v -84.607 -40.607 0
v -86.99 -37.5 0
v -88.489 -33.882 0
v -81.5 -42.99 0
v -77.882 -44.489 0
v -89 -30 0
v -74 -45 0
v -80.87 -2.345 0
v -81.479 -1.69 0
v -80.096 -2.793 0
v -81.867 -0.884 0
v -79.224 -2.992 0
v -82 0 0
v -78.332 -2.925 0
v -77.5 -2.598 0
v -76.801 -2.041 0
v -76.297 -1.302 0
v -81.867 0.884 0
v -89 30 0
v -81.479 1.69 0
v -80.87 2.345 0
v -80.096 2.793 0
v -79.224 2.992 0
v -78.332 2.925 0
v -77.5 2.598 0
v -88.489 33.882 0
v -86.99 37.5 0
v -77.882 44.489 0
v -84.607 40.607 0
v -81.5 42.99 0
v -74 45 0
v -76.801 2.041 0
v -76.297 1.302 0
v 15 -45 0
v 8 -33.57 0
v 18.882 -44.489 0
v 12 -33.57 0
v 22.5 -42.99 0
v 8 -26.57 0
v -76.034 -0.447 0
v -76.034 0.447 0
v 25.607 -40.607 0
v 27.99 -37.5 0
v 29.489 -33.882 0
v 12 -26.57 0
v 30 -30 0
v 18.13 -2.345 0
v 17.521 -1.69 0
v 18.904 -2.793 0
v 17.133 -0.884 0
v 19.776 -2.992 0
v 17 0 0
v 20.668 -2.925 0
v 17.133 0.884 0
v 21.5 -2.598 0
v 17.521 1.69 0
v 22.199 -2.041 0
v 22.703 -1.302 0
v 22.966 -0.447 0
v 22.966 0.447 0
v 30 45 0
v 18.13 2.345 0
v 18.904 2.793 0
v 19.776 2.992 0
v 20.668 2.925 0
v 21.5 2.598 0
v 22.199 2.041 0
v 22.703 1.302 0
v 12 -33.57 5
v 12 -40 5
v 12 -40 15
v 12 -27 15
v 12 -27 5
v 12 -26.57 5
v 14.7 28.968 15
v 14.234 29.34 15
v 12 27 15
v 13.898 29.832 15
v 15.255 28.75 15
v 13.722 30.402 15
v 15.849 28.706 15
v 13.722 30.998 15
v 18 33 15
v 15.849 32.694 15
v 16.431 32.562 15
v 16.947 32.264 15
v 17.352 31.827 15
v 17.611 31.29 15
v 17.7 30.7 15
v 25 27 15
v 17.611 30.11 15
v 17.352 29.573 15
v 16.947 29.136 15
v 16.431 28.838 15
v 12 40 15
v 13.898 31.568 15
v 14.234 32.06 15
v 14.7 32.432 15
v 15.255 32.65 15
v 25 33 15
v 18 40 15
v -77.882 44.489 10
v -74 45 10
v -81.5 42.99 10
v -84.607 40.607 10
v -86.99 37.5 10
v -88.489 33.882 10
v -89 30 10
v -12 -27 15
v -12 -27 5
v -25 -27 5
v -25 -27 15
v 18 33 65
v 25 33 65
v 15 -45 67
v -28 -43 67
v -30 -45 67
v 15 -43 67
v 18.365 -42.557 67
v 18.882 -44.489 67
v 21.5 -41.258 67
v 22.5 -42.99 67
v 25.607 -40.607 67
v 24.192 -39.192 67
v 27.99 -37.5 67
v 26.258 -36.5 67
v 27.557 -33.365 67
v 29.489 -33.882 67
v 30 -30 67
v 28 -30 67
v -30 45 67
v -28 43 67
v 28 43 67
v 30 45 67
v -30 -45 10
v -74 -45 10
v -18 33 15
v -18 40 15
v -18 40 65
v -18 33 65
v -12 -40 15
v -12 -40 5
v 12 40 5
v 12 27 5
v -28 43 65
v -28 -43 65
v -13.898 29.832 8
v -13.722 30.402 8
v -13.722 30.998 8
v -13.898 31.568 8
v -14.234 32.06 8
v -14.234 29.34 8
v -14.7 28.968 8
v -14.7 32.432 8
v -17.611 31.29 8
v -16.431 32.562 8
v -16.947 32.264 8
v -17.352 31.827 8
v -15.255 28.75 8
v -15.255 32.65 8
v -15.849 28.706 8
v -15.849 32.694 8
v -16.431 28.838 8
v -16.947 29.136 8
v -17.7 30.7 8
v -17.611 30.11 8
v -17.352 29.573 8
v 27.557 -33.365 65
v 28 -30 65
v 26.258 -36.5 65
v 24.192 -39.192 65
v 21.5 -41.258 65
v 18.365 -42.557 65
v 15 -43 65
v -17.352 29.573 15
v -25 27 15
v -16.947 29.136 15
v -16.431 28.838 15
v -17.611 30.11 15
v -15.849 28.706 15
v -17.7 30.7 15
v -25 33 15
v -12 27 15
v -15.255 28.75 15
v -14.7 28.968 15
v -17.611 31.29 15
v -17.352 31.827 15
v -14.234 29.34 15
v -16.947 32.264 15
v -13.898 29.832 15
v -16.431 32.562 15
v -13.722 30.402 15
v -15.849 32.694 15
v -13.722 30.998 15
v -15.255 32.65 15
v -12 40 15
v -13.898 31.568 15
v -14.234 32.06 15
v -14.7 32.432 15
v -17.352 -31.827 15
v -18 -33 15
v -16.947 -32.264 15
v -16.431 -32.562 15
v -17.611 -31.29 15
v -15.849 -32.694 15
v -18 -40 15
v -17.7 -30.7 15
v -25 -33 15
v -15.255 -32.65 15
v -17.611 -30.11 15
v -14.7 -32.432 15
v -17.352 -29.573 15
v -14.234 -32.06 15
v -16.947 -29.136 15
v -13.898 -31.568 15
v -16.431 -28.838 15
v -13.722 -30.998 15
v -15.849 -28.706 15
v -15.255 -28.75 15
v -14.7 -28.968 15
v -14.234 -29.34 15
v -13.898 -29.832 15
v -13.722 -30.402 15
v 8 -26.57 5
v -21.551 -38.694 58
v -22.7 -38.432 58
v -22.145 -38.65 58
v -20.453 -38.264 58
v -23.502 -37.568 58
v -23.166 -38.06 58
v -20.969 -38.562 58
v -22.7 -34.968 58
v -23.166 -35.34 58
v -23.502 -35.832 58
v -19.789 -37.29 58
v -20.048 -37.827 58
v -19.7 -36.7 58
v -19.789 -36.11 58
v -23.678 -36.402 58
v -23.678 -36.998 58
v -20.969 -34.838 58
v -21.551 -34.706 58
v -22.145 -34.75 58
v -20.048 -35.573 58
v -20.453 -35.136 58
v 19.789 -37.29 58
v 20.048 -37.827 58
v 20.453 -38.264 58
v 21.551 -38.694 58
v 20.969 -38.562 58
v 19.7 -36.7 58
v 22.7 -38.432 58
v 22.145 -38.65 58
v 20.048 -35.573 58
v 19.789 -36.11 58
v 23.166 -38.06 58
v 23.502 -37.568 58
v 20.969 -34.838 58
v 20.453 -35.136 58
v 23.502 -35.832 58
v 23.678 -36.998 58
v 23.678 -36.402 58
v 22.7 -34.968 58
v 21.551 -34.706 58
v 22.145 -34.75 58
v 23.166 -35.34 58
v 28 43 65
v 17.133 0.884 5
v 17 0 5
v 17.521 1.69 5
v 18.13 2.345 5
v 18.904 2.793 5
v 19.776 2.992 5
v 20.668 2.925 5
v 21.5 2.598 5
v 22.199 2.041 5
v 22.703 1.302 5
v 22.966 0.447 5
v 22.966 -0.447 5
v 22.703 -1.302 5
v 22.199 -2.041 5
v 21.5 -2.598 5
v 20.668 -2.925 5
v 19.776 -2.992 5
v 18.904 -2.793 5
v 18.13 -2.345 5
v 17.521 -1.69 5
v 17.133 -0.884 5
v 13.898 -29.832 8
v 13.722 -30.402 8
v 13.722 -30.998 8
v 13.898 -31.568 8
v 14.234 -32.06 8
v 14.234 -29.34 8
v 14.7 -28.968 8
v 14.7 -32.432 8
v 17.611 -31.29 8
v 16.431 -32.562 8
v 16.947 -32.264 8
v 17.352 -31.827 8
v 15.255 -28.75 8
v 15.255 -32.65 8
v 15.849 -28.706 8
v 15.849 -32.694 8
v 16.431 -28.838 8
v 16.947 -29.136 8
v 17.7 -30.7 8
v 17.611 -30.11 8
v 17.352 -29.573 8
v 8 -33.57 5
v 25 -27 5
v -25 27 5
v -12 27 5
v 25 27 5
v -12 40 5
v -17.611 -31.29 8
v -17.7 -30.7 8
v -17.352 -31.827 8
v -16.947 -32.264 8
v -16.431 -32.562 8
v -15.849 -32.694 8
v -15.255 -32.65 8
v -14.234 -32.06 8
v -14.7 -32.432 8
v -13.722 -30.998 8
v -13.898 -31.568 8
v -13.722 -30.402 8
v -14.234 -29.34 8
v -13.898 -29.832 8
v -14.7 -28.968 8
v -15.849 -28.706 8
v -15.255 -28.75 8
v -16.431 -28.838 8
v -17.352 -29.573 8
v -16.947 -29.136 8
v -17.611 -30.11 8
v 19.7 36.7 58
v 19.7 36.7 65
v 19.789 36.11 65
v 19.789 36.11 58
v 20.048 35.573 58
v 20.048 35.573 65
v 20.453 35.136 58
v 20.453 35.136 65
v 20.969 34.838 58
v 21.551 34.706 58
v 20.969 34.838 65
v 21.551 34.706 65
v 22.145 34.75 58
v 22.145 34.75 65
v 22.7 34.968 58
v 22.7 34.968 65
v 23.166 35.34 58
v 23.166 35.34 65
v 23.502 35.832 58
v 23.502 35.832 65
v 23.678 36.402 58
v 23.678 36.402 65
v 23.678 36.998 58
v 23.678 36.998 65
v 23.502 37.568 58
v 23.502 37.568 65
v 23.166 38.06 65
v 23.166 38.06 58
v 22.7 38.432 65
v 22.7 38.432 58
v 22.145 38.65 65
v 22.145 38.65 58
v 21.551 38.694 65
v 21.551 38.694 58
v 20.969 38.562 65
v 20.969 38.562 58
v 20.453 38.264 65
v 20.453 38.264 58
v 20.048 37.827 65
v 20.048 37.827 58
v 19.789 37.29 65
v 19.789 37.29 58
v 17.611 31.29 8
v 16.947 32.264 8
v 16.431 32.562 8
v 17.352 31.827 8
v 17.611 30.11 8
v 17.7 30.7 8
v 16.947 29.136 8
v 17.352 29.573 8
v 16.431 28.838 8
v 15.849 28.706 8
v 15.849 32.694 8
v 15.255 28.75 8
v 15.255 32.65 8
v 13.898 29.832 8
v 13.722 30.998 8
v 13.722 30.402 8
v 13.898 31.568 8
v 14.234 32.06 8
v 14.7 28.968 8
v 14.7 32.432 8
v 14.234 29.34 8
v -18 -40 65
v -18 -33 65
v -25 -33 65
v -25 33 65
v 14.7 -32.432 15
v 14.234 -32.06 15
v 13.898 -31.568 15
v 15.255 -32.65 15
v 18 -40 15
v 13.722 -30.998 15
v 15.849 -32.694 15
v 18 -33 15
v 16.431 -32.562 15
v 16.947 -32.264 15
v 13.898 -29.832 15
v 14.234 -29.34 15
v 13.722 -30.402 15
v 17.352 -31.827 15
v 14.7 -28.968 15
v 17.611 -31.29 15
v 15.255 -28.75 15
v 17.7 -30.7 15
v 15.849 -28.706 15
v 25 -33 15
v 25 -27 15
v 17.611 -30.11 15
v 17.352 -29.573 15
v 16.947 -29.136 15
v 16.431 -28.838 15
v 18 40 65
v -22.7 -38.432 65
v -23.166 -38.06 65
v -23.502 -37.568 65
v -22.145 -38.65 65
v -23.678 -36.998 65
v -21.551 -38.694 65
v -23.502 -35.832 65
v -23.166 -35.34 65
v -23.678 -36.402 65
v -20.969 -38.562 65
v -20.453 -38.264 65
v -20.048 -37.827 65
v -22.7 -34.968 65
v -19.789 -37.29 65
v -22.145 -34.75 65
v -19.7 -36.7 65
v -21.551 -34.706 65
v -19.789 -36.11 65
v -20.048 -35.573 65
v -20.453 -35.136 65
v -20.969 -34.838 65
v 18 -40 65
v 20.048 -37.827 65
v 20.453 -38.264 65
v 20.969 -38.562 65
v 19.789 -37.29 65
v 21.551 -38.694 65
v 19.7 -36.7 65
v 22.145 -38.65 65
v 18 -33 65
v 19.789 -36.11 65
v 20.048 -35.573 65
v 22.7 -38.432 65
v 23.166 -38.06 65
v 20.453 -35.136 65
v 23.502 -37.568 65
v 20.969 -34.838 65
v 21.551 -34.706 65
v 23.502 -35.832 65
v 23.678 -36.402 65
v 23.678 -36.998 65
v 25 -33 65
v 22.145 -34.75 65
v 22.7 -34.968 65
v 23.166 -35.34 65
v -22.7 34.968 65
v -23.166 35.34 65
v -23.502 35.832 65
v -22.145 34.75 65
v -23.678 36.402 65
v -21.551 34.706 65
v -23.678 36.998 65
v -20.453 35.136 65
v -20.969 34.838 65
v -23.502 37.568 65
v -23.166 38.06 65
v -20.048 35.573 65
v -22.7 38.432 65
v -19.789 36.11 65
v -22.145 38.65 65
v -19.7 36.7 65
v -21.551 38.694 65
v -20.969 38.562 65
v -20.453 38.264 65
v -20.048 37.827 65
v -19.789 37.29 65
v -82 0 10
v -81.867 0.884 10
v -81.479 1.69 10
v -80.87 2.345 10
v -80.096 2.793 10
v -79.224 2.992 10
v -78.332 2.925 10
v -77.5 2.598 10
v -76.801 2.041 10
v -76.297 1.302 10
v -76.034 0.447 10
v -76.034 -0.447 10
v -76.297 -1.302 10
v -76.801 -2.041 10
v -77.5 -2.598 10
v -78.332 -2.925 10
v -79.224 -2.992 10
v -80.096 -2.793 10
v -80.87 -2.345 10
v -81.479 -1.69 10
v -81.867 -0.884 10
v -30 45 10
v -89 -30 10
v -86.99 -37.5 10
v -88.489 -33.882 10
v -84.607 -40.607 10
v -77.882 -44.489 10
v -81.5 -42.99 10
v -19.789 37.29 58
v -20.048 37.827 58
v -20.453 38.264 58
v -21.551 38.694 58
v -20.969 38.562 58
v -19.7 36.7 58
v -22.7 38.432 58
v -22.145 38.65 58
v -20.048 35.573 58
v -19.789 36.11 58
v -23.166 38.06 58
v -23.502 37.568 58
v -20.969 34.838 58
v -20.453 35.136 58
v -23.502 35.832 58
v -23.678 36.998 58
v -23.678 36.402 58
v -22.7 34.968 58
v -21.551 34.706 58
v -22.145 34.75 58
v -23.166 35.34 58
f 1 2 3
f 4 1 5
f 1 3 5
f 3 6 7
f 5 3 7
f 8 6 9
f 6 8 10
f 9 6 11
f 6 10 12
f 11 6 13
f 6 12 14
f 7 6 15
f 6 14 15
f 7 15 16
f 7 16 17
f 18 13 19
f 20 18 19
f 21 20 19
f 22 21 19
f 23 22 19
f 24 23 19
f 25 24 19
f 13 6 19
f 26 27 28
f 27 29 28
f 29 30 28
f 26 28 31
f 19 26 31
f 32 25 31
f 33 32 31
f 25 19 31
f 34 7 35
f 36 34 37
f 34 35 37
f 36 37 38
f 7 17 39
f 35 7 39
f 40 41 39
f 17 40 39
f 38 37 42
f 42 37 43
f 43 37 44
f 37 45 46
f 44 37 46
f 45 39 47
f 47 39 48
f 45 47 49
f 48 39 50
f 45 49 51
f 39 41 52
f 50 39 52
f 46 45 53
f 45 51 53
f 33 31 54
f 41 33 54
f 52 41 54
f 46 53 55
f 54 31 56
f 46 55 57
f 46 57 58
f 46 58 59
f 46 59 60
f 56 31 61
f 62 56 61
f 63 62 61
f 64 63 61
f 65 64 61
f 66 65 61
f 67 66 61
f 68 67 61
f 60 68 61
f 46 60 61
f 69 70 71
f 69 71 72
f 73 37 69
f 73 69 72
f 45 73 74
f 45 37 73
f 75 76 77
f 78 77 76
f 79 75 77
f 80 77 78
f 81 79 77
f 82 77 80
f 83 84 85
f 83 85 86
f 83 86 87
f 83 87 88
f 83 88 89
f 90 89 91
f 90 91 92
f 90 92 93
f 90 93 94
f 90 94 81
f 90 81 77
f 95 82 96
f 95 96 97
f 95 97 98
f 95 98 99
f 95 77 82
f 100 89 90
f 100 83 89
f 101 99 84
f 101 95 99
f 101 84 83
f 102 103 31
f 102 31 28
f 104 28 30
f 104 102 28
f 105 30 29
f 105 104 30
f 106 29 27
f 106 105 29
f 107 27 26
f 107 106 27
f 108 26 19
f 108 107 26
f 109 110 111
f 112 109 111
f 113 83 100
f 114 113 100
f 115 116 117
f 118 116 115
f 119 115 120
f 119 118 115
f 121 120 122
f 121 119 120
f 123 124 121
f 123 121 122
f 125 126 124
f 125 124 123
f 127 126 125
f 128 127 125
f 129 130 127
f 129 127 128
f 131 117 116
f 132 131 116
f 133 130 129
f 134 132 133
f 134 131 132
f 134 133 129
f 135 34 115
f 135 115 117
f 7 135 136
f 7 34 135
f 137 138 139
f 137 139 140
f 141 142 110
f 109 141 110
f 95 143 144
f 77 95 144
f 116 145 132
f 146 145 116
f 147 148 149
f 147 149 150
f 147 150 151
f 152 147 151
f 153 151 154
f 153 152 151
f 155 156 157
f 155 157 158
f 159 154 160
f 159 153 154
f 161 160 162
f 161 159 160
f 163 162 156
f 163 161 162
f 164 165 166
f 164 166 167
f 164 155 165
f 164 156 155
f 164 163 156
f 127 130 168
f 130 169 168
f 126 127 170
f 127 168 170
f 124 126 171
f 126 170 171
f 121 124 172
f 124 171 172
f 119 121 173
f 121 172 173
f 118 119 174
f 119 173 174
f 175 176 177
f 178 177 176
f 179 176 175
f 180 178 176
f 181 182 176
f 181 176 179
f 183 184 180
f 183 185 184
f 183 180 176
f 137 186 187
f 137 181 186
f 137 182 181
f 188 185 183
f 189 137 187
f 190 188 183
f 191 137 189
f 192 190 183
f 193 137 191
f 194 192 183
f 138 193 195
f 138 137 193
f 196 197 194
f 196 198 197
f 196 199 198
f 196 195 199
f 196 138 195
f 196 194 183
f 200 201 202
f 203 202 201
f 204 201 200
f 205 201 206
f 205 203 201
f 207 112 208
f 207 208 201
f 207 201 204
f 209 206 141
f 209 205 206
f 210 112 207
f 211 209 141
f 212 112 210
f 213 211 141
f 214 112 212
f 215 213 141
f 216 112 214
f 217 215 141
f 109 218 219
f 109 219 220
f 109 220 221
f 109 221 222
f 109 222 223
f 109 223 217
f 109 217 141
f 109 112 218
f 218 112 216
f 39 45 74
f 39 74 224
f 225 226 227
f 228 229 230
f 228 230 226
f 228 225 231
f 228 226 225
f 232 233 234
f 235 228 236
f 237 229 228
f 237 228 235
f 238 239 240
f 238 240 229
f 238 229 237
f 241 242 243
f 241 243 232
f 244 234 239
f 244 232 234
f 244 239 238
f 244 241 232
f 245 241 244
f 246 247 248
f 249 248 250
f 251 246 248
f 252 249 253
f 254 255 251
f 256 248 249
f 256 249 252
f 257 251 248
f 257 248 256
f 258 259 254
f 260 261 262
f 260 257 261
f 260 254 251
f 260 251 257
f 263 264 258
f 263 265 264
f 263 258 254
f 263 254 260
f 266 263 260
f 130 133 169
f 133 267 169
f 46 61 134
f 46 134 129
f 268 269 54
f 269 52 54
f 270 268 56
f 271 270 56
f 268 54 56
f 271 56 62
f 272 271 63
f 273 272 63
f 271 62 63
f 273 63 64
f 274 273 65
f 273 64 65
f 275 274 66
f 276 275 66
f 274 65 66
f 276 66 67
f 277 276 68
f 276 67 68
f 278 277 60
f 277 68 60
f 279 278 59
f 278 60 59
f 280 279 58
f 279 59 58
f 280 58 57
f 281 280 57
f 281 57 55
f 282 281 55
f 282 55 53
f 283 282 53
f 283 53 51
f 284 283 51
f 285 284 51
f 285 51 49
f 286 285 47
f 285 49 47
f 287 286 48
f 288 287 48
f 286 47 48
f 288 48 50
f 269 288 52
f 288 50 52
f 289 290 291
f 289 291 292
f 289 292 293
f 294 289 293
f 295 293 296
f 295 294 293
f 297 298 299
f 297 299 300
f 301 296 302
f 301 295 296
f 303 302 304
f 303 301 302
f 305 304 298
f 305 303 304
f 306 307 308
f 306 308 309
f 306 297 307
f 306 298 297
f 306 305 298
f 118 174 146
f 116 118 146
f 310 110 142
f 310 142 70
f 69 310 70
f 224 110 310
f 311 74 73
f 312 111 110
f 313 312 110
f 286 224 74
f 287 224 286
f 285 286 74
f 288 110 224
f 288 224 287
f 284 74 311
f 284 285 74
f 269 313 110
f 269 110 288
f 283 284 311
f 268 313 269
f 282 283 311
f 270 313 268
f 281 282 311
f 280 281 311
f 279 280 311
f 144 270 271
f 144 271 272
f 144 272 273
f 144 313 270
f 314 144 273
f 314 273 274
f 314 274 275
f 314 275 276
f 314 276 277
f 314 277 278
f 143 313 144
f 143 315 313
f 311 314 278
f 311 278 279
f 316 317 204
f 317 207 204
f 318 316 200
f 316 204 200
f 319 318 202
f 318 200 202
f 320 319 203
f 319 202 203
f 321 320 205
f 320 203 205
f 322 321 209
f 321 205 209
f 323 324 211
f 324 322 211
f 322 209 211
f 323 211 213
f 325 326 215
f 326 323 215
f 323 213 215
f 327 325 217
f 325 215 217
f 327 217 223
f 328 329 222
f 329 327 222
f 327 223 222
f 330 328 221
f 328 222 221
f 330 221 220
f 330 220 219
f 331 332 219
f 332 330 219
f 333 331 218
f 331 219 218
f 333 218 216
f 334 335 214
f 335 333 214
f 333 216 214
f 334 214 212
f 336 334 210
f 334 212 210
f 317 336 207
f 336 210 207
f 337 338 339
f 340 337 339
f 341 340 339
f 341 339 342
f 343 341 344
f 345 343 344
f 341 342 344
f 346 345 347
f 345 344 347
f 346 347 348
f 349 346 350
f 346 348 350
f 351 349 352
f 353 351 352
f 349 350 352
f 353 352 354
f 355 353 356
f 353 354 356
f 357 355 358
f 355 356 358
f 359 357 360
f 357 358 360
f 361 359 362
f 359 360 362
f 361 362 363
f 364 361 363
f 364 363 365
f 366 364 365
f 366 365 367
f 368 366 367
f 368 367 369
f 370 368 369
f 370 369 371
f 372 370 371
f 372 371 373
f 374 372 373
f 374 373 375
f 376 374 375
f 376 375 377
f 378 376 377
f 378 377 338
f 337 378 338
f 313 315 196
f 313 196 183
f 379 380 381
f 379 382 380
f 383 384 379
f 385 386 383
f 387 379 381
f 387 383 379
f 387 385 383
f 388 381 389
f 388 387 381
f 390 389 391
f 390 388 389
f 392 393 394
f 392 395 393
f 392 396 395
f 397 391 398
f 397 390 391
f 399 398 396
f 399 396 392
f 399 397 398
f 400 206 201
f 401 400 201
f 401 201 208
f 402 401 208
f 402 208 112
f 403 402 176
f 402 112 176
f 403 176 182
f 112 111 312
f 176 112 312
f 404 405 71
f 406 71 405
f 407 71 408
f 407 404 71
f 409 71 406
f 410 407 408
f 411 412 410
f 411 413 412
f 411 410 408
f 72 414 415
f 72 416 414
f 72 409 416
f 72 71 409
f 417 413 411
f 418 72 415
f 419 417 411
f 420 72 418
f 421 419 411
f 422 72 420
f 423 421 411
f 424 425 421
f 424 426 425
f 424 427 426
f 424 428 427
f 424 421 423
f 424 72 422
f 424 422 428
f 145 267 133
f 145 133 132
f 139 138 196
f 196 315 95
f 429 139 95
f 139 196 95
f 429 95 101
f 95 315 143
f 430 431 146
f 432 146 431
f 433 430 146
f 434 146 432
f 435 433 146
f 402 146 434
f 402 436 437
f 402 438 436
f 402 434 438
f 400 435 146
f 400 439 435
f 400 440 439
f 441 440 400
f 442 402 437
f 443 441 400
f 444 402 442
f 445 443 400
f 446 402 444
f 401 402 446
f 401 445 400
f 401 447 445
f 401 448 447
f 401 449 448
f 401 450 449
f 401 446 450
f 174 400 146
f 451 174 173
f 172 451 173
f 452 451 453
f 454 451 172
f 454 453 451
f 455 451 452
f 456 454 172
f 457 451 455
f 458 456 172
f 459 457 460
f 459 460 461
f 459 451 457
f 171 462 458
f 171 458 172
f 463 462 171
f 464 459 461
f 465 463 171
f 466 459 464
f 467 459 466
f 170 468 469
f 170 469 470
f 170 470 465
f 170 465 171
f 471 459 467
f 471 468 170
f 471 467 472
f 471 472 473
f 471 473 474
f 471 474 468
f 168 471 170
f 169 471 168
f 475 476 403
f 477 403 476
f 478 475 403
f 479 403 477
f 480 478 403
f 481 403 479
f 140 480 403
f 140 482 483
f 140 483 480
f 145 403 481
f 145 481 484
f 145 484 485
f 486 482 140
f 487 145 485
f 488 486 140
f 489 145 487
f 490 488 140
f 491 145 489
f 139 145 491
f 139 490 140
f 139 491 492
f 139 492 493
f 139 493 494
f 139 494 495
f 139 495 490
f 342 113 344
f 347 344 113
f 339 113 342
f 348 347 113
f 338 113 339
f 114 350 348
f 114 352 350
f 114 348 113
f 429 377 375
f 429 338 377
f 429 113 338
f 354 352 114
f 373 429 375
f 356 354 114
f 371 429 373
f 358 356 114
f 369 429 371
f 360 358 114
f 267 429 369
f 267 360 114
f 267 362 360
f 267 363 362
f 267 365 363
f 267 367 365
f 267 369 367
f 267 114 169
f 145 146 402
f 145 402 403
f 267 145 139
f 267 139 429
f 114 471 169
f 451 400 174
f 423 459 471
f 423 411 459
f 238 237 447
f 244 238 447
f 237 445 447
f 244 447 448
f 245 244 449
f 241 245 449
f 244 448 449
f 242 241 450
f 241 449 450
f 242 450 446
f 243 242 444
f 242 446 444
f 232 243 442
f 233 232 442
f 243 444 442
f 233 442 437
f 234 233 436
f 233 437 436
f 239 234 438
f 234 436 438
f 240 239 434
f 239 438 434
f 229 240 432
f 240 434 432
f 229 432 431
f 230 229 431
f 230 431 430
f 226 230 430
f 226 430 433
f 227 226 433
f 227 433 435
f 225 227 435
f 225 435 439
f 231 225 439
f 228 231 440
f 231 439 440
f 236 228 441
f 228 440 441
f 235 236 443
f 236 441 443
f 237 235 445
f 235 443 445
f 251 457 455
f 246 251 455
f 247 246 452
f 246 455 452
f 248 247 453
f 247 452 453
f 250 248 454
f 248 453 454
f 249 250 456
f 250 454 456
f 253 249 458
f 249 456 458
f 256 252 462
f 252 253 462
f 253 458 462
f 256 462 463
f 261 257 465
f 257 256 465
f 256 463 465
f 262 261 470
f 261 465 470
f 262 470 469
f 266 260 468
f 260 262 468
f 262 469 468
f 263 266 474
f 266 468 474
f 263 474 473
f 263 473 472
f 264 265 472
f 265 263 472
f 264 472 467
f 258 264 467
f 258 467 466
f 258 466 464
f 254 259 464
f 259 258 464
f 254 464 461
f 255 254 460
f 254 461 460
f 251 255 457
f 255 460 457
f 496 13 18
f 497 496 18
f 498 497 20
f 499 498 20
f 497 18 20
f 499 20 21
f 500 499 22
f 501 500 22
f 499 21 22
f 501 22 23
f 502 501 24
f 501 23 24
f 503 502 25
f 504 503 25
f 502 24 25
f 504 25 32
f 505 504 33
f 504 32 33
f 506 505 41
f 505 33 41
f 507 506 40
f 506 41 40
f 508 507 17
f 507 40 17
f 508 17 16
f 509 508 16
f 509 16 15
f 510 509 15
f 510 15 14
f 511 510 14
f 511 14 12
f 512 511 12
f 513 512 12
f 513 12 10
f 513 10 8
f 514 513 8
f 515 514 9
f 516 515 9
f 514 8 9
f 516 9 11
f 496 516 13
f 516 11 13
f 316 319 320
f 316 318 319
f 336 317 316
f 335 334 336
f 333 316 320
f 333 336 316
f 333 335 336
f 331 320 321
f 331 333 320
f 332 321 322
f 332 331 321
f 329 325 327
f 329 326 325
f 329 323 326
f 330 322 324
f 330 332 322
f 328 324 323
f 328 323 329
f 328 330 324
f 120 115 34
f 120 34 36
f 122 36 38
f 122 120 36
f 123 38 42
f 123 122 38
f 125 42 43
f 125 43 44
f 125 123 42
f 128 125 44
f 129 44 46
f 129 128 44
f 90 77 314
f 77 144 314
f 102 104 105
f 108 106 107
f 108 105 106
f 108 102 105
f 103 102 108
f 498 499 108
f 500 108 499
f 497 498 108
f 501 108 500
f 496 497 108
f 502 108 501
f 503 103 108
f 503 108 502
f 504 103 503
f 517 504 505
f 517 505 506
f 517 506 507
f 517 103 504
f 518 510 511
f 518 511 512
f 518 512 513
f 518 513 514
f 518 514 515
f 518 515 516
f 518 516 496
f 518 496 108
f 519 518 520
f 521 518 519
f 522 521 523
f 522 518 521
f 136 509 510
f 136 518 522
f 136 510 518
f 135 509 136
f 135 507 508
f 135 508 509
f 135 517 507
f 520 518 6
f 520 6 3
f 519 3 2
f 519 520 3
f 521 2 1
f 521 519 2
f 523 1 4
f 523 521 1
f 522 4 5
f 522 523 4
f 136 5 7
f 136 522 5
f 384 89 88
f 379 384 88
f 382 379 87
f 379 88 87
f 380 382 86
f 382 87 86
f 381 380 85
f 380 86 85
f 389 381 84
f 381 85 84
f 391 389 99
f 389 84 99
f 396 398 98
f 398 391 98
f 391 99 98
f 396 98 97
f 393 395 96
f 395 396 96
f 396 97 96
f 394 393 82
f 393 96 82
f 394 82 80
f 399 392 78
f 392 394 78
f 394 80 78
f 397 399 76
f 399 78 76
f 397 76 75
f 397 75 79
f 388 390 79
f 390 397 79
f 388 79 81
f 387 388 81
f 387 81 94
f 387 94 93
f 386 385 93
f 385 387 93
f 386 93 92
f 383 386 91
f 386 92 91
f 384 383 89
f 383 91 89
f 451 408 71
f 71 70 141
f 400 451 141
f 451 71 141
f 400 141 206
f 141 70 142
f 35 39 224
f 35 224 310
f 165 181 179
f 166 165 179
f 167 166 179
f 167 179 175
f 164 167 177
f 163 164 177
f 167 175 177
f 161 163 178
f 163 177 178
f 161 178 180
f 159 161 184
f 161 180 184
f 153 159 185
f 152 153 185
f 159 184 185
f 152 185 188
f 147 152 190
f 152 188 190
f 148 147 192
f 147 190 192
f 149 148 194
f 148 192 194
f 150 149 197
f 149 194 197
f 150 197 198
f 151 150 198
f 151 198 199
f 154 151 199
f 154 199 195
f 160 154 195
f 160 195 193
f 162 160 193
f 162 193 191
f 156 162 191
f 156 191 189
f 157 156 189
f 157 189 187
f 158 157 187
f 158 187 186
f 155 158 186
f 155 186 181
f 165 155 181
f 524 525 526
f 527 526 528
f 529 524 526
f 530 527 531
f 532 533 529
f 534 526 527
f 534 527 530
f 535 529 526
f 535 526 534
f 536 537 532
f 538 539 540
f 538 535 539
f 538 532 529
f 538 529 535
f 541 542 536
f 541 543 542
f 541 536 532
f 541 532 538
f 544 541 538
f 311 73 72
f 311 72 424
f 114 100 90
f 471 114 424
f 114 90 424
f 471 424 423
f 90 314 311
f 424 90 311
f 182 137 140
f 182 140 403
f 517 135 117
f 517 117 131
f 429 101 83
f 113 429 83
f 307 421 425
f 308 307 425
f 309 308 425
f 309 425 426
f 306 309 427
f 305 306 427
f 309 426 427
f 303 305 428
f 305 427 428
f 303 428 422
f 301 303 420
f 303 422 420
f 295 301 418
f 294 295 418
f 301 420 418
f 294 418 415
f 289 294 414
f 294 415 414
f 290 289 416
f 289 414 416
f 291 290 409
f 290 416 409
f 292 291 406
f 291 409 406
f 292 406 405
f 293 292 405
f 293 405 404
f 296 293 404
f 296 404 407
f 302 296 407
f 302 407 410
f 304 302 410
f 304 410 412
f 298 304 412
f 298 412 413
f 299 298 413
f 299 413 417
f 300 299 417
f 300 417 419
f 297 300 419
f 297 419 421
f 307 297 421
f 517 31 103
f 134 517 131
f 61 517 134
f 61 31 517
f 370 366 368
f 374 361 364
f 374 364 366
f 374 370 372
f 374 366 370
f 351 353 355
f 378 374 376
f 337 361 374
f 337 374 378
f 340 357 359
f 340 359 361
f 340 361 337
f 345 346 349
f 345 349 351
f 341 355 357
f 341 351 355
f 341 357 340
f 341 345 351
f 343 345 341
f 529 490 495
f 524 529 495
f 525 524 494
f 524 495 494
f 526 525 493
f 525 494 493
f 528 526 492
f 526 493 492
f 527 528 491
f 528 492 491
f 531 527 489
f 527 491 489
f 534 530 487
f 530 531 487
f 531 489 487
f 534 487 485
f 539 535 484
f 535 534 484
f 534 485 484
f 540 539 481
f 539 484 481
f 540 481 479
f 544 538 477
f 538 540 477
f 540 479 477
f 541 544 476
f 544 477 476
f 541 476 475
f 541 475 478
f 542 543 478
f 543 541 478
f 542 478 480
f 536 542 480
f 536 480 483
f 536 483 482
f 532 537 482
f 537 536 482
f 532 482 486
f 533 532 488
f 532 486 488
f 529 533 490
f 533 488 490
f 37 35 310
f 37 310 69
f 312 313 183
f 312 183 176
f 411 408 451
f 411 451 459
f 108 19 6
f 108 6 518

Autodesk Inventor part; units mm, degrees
ref_plane "YZ Plane" through (0, 0, 0) normal (1, 0, 0) x (0, 1, 0)
ref_plane "XZ Plane" through (0, 0, 0) normal (0, 1, 0) x (-1, 0, 0)
ref_plane "XY Plane" through (0, 0, 0) normal (0, 0, 1) x (1, 0, 0)
sketch "Skizze61" plane through (0, 0, 0) normal (0, 0, 1) x (1, 0, 0)
  line L0 (30, -45) -> (-30, -45)
  line L1 (-30, -45) -> (-30, 45)
  line L2 (-30, 45) -> (30, 45)
  line L3 (30, 45) -> (30, -45)
  line L4 (30, -45) -> (-30, 45) construction
  line L5 (-30, -45) -> (30, 45) construction
  point P0 (0, 0)
  dimension "d159" = 60
  dimension "d160" = 90
extrude "Extrusion54" add sketch "Skizze61" along normal blind 65
shell "Wandung3" thickness 5 removed faces 1 at (-10, 15, 65)
sketch "Sketch69" plane through (-30, -45, 0) normal (-1, 0, 0) x (0, 0, 1)
  line L0 (0, 90) -> (65, 90) projected
  line L1 (0, 0) -> (65, 0) projected
  line L2 (0, 90) -> (10, 90)
  line L3 (10, 90) -> (10, 0)
  line L4 (10, 0) -> (0, 0)
  line L5 (0, 0) -> (0, 90)
  point P0 (0, 45)
  dimension "d192" = 10
extrude "Extrusion61" add sketch "Sketch69" along normal blind 59
sketch "Sketch71" plane through (0, 0, 0) normal (0, 0, -1) x (-1, 0, 0)
  line L0 (-8, -33.57) -> (-12, -33.57)
  line L1 (-12, -33.57) -> (-12, -26.57)
  line L2 (-12, -26.57) -> (-8, -26.57)
  line L3 (-8, -26.57) -> (-8, -33.57)
  line L4 (89, 45) -> (89, -45) projected
  line L5 (-30, -45) -> (89, -45) projected
  point P0 (0, 0)
  dimension "d199" = 4
  dimension "d200" = 7
  dimension "d201" = 97
  dimension "d202" = 11.43
extrude "Extrusion63" cut sketch "Sketch71" against normal blind 10
sketch "Sketch70" plane through (0, 0, 0) normal (0, 0, -1) x (-1, 0, 0)
  line L0 (30, 45) -> (89, 45) projected
  line L1 (30, -45) -> (89, -45) projected
  line L2 (89, 45) -> (69, 45)
  line L3 (69, 45) -> (69, -45)
  line L4 (69, -45) -> (89, -45)
  line L5 (89, -45) -> (89, 45)
  circle A0 centre (79, 0) radius 3
  point P0 (0, 0)
  dimension "d195" = 20
  dimension "d196" = 6
extrude "Extrusion62" cut sketch "Sketch70" against normal through all contours A0
sketch "Sketch72" plane through (0, 0, 0) normal (0, 0, -1) x (-1, 0, 0)
  circle A0 centre (-20, 0) radius 3
  line L0 (-30, -45) -> (-30, 45) projected
  point P0 (0, 0)
  dimension "d205" = 6
  dimension "d206" = 10
extrude "Extrusion64" cut sketch "Sketch72" against normal through all
sketch "Sketch73" plane through (0, 0, 0) normal (0, 0, -1) x (-1, 0, 0)
  point P0 (0, 0)
fillet "Rundung1" radius 15 2 edges at (-89, 45, 5) (-89, -45, 5)
fillet "Rundung2" radius 15 1 edges at (30, -45, 32.5)
sketch "Skizze78" plane through (-25, 40, 5) normal (0, 0, 1) x (1, 0, 0)
  line L0 (0, 0) -> (7, 0)
  line L1 (7, 0) -> (7, -7)
  line L2 (7, -7) -> (0, -7)
  line L3 (0, -7) -> (0, 0)
  line L4 (50, -80) -> (50, 0) projected
  line L5 (50, 0) -> (43, 0)
  line L6 (43, 0) -> (43, -7)
  line L7 (43, -7) -> (50, -7)
  line L8 (50, -7) -> (50, 0)
  line L9 (50, -80) -> (0, -80) projected
  line L10 (0, -80) -> (7, -80)
  line L11 (7, -80) -> (7, -73)
  line L12 (7, -73) -> (0, -73)
  line L13 (0, -73) -> (0, -80)
  line L14 (50, -80) -> (43, -80)
  line L15 (43, -80) -> (43, -73)
  line L16 (43, -73) -> (50, -73)
  line L17 (50, -73) -> (50, -80)
  point P0 (25, -40)
  dimension "d239" = 7
  dimension "d240" = 7
  dimension "d241" = 7
  dimension "d242" = 7
  dimension "d243" = 7
  dimension "d244" = 7
  dimension "d245" = 7
  dimension "d246" = 7
extrude "Extrusion68" add sketch "Skizze78" along normal up to surface (60 mm away)
sketch "Skizze79" plane through (0, 0, 65) normal (0, 0, 1) x (1, 0, 0)
  line L0 (30, 45) -> (-30, 45) projected
  line L1 (-30, -45) -> (15, -45) projected
  line L2 (-30, 45) -> (-28, 45)
  line L3 (-28, 45) -> (-28, -45)
  line L4 (-28, -45) -> (-30, -45)
  line L5 (-30, -45) -> (-30, 45)
  line L6 (30, -30) -> (30, 45) projected
  line L7 (-28, 45) -> (30, 45)
  line L8 (30, 45) -> (30, 43)
  line L9 (30, 43) -> (-28, 43)
  line L10 (-28, 43) -> (-28, 45)
  line L11 (30, 43) -> (28, 43)
  line L12 (28, 43) -> (28, -30)
  line L13 (28, -30) -> (30, -30)
  line L14 (30, -30) -> (30, 43)
  line L15 (-28, -45) -> (15, -45)
  line L16 (15, -45) -> (15, -43)
  line L17 (15, -43) -> (-28, -43)
  line L18 (-28, -43) -> (-28, -45)
  arc A0 (15, -45) -> (30, -30) centre (15, -30) ccw projected
  arc A1 (15, -45) -> (30, -30) centre (15, -30) ccw
  arc A2 (15, -43) -> (28, -30) centre (15, -30) ccw
  point P0 (0, 0)
  point P1 (-28, -43)
  point P2 (29, -30)
  dimension "d249" = 2
  dimension "d250" = 2
  dimension "d251" = 2
  dimension "d252" = 2
  dimension "d268" = 75
extrude "Extrusion69" add sketch "Skizze79" along normal blind 2 contours L6 L9 L3 L0 | L3 L1 L5 L0 | L6 L13 L12 L9 | A0 L16 A2 L13 | L17 L16 L1 L3
sketch "Skizze80" plane through (-18, -40, 5) normal (0, 0, 1) x (1, 0, 0)
  line L0 (0, 80) -> (36, 80) projected
  line L1 (0, 80) -> (6, 80)
  line L2 (6, 80) -> (6, 67)
  line L3 (6, 67) -> (0, 67)
  line L4 (0, 67) -> (0, 80)
  line L5 (-7, 7) -> (-7, 73) projected
  line L6 (0, 67) -> (-7, 67)
  line L7 (-7, 67) -> (-7, 73)
  line L8 (-7, 73) -> (0, 73)
  line L9 (0, 73) -> (0, 67)
  line L10 (36, 73) -> (36, 80) projected
  line L11 (36, 80) -> (30, 80)
  line L12 (30, 80) -> (30, 67)
  line L13 (30, 67) -> (36, 67)
  line L14 (36, 67) -> (36, 80)
  line L15 (43, 7) -> (43, 73) projected
  line L16 (36, 67) -> (43, 67)
  line L17 (43, 67) -> (43, 73)
  line L18 (43, 73) -> (36, 73)
  line L19 (36, 73) -> (36, 67)
  line L20 (-7, 7) -> (6, 7)
  line L21 (6, 7) -> (6, 13)
  line L22 (6, 13) -> (-7, 13)
  line L23 (-7, 13) -> (-7, 7)
  line L24 (36, 0) -> (0, 0) projected
  line L25 (6, 7) -> (0, 7)
  line L26 (0, 7) -> (0, 0)
  line L27 (0, 0) -> (6, 0)
  line L28 (6, 0) -> (6, 7)
  line L29 (43, 7) -> (30, 7)
  line L30 (30, 7) -> (30, 13)
  line L31 (30, 13) -> (43, 13)
  line L32 (43, 13) -> (43, 7)
  line L33 (36, 0) -> (30, 0)
  line L34 (30, 0) -> (30, 7)
  line L35 (30, 7) -> (36, 7)
  line L36 (36, 7) -> (36, 0)
  point P0 (18, 40)
  point P1 (43, 7)
  point P2 (43, 13)
  point P3 (30, 0)
  point P4 (-7, 13)
  point P5 (6, 0)
  point P6 (36, 73)
  point P7 (0, 73)
  point P8 (-7, 67)
  dimension "d255" = 6
  dimension "d256" = 13
  dimension "d257" = 6
  dimension "d258" = 13
  dimension "d259" = 7
  dimension "d260" = 6
  dimension "d261" = 13
  dimension "d262" = 6
  dimension "d263" = 6
  dimension "d264" = 13
  dimension "d265" = 6
  dimension "d274" = 13
extrude "Extrusion70" add sketch "Skizze80" along normal blind 10 contours L0 L2 L3 L4 | L4 L6 L5 L8 | L0 L10 L14 L13 L12 | L18 L15 L16 L14 | L22 L21 L20 L5 | L15 L29 L30 L31 | L20 L28 L24 L26 | L36 L24 L34 L29
sketch "Skizze81" plane through (0, 0, 65) normal (0, 0, 1) x (1, 0, 0)
  circle A0 centre (-21.7, -36.7) radius 2
  line L0 (-18, -33) -> (-18, -40) projected
  line L1 (-25, -33) -> (-18, -33) projected
  point P0 (0, 0)
  dimension "d269" = 3.7
  dimension "d270" = 3.7
  dimension "d271" = 4
extrude "Extrusion71" cut sketch "Skizze81" against normal blind 7
mirror "Spiegeln11" about plane through (0, 0, 0) normal (1, 0, 0) of "Extrusion71"
mirror "Spiegeln12" about plane through (0, 0, 0) normal (0, 1, 0) of "Extrusion71", "Spiegeln11"
sketch "Skizze82" plane through (-18, -40, 15) normal (0, 0, 1) x (1, 0, 0)
  circle A0 centre (33.7, 9.3) radius 2
  line L0 (30, 13) -> (30, 0) projected
  line L1 (43, 13) -> (30, 13) projected
  point P0 (18, 40)
  dimension "d275" = 4
  dimension "d276" = 3.7
  dimension "d277" = 3.7
extrude "Extrusion72" cut sketch "Skizze82" against normal blind 7
mirror "Spiegeln13" about plane through (0, 0, 0) normal (0, 1, 0) of "Extrusion72"
mirror "Spiegeln14" about plane through (0, 0, 0) normal (1, 0, 0) of "Extrusion72", "Spiegeln13"
properties part number "Gehäuse"
